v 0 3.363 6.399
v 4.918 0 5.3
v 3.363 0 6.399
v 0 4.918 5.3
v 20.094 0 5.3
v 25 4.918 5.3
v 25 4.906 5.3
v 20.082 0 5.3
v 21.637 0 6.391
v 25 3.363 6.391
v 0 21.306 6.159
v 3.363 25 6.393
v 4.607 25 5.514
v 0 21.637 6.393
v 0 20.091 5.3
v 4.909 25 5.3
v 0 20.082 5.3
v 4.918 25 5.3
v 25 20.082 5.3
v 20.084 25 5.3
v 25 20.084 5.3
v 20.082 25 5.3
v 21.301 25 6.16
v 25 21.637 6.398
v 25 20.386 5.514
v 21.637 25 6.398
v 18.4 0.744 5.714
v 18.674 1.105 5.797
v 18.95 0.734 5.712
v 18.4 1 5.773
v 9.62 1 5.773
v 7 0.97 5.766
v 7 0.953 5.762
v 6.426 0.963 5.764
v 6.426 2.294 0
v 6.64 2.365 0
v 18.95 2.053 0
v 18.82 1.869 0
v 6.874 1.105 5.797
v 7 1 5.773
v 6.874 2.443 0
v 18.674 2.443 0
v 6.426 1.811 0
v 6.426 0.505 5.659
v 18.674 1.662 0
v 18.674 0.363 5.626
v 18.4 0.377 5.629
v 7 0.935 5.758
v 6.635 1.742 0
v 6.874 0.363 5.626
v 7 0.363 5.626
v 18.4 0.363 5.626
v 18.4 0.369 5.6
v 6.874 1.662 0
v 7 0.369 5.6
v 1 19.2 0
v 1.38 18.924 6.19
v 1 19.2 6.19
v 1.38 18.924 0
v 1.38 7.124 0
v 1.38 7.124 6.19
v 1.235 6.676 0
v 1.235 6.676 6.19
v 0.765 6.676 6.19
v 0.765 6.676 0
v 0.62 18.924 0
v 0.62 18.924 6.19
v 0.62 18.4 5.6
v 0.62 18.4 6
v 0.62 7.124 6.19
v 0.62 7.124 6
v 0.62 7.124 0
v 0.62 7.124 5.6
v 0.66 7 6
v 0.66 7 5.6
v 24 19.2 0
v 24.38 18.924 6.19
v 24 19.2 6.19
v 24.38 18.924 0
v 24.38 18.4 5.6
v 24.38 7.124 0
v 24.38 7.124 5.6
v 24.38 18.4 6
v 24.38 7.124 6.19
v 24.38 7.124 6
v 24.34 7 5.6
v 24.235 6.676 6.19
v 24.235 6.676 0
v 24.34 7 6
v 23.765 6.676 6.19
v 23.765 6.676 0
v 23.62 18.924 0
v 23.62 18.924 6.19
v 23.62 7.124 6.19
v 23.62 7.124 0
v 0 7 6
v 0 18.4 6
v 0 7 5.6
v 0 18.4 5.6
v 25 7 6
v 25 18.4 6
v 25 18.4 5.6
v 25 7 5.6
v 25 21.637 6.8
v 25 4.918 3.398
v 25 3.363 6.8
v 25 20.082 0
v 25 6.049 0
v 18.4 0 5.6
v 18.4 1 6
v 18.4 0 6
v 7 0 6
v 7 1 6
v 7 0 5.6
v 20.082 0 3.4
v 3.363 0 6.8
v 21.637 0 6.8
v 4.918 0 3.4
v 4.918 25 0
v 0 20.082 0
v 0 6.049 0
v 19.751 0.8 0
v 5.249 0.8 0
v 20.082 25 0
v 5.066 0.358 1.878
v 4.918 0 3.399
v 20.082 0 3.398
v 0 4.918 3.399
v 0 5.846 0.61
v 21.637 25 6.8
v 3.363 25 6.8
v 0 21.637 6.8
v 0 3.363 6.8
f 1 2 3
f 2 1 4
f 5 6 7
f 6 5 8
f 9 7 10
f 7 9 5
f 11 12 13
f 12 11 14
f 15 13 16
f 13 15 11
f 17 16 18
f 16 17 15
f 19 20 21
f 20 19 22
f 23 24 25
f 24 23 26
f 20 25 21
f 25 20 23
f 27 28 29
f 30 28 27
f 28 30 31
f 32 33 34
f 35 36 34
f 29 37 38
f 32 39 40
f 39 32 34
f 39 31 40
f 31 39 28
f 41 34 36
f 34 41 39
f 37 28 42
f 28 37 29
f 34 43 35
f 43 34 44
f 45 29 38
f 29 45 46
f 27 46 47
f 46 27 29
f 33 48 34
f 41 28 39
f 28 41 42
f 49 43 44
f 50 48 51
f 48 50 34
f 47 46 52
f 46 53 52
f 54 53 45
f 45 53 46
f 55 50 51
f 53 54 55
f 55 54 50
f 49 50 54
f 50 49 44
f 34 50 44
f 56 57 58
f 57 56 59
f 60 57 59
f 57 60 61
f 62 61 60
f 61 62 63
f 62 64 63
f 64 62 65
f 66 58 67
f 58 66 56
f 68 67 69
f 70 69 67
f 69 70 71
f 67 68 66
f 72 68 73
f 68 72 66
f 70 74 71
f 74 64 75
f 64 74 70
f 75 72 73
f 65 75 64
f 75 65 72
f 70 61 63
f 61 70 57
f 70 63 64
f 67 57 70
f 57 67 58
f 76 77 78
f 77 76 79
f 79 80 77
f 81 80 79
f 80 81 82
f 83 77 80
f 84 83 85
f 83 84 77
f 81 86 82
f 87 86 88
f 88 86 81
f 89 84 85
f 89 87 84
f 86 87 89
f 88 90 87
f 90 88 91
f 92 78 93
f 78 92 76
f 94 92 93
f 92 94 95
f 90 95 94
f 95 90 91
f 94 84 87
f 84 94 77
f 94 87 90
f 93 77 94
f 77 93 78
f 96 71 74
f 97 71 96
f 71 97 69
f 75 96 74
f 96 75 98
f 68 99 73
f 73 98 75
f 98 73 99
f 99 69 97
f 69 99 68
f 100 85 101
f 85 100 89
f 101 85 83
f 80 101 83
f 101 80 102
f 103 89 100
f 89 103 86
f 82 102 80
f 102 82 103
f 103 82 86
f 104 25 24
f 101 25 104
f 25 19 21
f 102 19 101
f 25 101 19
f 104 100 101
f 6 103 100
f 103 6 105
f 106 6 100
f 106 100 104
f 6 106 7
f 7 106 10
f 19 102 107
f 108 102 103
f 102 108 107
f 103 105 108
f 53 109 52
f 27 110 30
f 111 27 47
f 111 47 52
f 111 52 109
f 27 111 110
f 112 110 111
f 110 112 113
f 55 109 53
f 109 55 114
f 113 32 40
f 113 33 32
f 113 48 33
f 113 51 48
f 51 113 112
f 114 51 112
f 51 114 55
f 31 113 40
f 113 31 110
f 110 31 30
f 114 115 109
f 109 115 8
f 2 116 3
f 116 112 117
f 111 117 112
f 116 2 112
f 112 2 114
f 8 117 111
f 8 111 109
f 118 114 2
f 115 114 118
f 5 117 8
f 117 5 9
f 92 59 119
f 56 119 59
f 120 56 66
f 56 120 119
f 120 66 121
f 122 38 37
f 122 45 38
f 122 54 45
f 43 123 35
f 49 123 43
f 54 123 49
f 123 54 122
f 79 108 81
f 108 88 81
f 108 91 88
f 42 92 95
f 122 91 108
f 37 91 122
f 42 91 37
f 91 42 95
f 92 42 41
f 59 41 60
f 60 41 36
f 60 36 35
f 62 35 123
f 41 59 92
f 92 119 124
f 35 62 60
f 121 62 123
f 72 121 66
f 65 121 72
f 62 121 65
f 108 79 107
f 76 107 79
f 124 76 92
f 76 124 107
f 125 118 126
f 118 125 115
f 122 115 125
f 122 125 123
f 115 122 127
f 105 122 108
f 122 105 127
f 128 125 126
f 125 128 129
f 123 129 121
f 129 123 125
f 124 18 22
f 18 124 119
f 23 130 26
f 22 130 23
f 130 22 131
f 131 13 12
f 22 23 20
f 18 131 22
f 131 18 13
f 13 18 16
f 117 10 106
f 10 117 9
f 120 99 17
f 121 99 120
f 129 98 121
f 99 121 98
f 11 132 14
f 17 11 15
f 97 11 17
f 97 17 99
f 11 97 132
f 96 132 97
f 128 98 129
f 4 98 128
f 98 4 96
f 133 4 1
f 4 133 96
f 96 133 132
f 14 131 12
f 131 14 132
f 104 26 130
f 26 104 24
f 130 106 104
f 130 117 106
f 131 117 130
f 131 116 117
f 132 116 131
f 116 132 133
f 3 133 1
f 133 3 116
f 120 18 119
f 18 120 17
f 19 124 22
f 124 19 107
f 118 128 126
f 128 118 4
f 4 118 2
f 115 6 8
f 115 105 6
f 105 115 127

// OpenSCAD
// openGrid snap type for connecting to base plates.
// The Full type is directional.
snap_type = "Full"; // [Full, Lite]

// The fitment affects the tightness of the snap when mounted (ease of removing the peg)
// Use a value between 0.0 and 1.0, with 0.5 meaning a standard fit.
// A value between 0.66-0.75 would be a tight fit, and a value of 1.0 would be very difficult to insert and remove.
snap_fitment = 0.66;

/* [Hidden] */

/*///////////////////////////
    OPENGRID SNAP
*////////////////////////////

side_length = 18.2745;
short_side_length = 15.1632;
full_side_length = 25;
cutout_offset = (full_side_length - side_length) / 2;
large_cutout_offset = (full_side_length - short_side_length) / 2;
short_tab_length = 10.8;

full_snap_thickness = 6.8;
lite_snap_thickness = 3.4;
snap_diff_thickness = full_snap_thickness - lite_snap_thickness;

module large_corner_cutouts() {
    linear_extrude(height = 5.3)
        polygon(
            points = [
                [0,0],
                [0, large_cutout_offset],
                [large_cutout_offset, 0],
                [0, full_side_length-large_cutout_offset],
                [0, full_side_length],
                [large_cutout_offset, full_side_length],
                [full_side_length-large_cutout_offset, full_side_length],
                [full_side_length, full_side_length],
                [full_side_length, full_side_length-large_cutout_offset],
                [full_side_length, large_cutout_offset],
                [full_side_length, 0],
                [full_side_length-large_cutout_offset, 0]
            ],
            paths = [[0, 1, 2], [3, 4, 5], [6, 7, 8], [9, 10, 11]]
        );
};

module corner_overhang_cutout_template() {
    translate([0, 0, 5.3])
        rotate([90, 0, 45])
            linear_extrude(height = 10)
                polygon(
                    points = [
                        [0, 0],
                        [0, 1.1],
                        [1.1, 0]
                    ],
                    paths = [[0, 1, 2]]
                );
};

module corner_overhang_cutouts() {
    translate([-.8, 4.162, 0])
        corner_overhang_cutout_template();
    
    rotate([0, 0, 90])
        translate([-1.65, -20,0])
            corner_overhang_cutout_template();
    
    rotate([0, 0, -90])
        translate([-27, 5.353, 0])
            corner_overhang_cutout_template();
    
    rotate([0, 0, 180])
        translate([-27, -19.64, 0])
            corner_overhang_cutout_template();
};

module bottom_slot_cutout_template() {
    hull()
        linear_extrude(height = 6.2) {
            circle(r = 0.4);
            translate([11.8, 0, 0]) {
                circle(r = 0.4);
            };
        };
};

module bottom_slot_cutouts() {
    rotate([13, 0, 0])
        translate([6.75, 2,-7])
            scale([1, 1, 2])
            bottom_slot_cutout_template();

    translate([1, 7, -0.01])
        rotate([0, 0, 90])
            bottom_slot_cutout_template();
    
    translate([24, 7, -0.01])
        rotate([0, 0, 90])
            bottom_slot_cutout_template();
};

module triangle_directional_cutout_template() {
    base_size = 3;
    top_scale = 0.75;
    height = 0.4;
    sin60 = 0.866;
    cos60 = 0.5;
    
    // 2D base triangle points
    base = [
        [0, -base_size],
        [base_size * sin60, base_size * cos60],
        [-base_size * sin60, base_size * cos60]
    ];
    
    // Convert to 3D
    base_3d = [ for (v = base) [v[0], v[1], 0] ];
    top     = [ for (v = base) [v[0] * top_scale, v[1] * top_scale, height] ];
    
    points = concat(base_3d, top);
    
    faces = [
        [0, 1, 2],       // bottom
        [3, 4, 5],       // top
        [0, 1, 4], [0, 4, 3],   // side 1
        [1, 2, 5], [1, 5, 4],   // side 2
        [2, 0, 3], [2, 3, 5]    // side 3
    ];
    
    polyhedron(points = points, faces = faces);
};

module triangle_directional_cutout() {
    translate([full_side_length/2, full_side_length*0.85, -0.1])
        rotate([0, 0, 180])
            triangle_directional_cutout_template();
};

module side_slot_cutouts() {
    length = 11.4;
    width = 1;
    height = 0.4;
    top_shelf_thickness = 1.2;
    top_distance = full_snap_thickness - top_shelf_thickness;
    
    translate([.75, 7, top_distance])
        rotate([0, 0, 90])
            cube([length, width, height]);
            
    translate([full_side_length-width+width, 7, top_distance])
        rotate([0, 0, 90])
            cube([length, width, height]);
    
    translate([7, 0, top_distance])
        cube([length, width, height]);
        
};

module snap_tab_large_template() {
    base_x = 14;
    base_y = 4;
    top_x = 9.5;
    top_y = 2.2;
    height = 0.8;

    // Offsets to center the top over the base
    dx = (base_x - top_x) / 2;
    dy = (base_y - top_y) / 2;

    points = [
        // Base (Z = 0)
        [0,      0,      0],  // 0
        [base_x, 0,      0],  // 1
        [base_x, base_y, 0],  // 2
        [0,      base_y, 0],  // 3

        // Top (Z = height), centered
        [dx,        dy,        height],  // 4
        [dx+top_x,  dy,        height],  // 5
        [dx+top_x,  dy+top_y,  height],  // 6
        [dx,        dy+top_y,  height]   // 7
    ];

    faces = [
        [0, 1, 2, 3],  // bottom
        [4, 5, 6, 7],  // top
        [0, 1, 5, 4],  // side 1
        [1, 2, 6, 5],  // side 2
        [2, 3, 7, 6],  // side 3
        [3, 0, 4, 7]   // side 4
    ];

    polyhedron(points=points, faces=faces);
};

module snap_tab_small_template(fitment) {
    scale([0.8, 0.5, fitment])
        snap_tab_large_template();
}

module snap_tabs(type, fitment) {

    // full or lite tab for top edge
    if (type == "Full") {
        translate([(full_side_length+14)/2, full_side_length, 1.4])
            rotate([90, 0, 180])
                snap_tab_large_template();
    } else {
        translate([(full_side_length+short_tab_length)/2+0.4, full_side_length, snap_diff_thickness])
            rotate([90, 0, 180])
                snap_tab_small_template(fitment);
    }
    
    // short tab at bottom
    translate([(full_side_length-short_tab_length)/2, 0, snap_diff_thickness])
        rotate([90, 0, 0])
            snap_tab_small_template(fitment);
    
    // short tab on left
    translate([0, (full_side_length+short_tab_length)/2+0.4, snap_diff_thickness])
        rotate([90, 0, -90])
            snap_tab_small_template(fitment);
    
    // short tab on right
    translate([full_side_length, (full_side_length-short_tab_length)/2, snap_diff_thickness])
        rotate([90, 0, 90])
            snap_tab_small_template(fitment);
};

module lite_snap_cutout() {
    linear_extrude(height = snap_diff_thickness)
        polygon(
            points = [
                [0, 0],
                [0, 30],
                [30, 30],
                [30, 0]
            ],
            paths = [[0, 1, 2, 3]]
        );
}

module bottom_half_snapfit_cutter() {
    rotate([90, 0, 90])
        linear_extrude(height = 20)
            polygon(
                points = [
                    [0, 0],
                    [0.8, 0], 
                    [0, 3.4]
                ],
                paths = [[0, 1, 2]]
            );
};

module bottom_half_snapfit_cutouts() {
    translate([3, 0, 0])
        bottom_half_snapfit_cutter();

    translate([full_side_length-cutout_offset-1.555, 0, 0])
        rotate([0, 0, 45])
            bottom_half_snapfit_cutter();
            
    translate([-3, 7.918, 0])
        rotate([0, 0, -45])
            bottom_half_snapfit_cutter();
};

module primary_box() {
    linear_extrude(height = full_snap_thickness)
        polygon(
            points = [
                [0, cutout_offset],
                [0, cutout_offset+side_length],
                [cutout_offset, full_side_length],
                [cutout_offset+side_length, full_side_length],
                [full_side_length, cutout_offset+side_length],
                [full_side_length, cutout_offset],
                [cutout_offset+side_length, 0],
                [cutout_offset, 0]
            ],
            paths = [[0, 1, 2, 3, 4, 5, 6, 7]]
        );
};

module opengrid_snap(type, fitment) {
    union() {
        difference() {
            primary_box();
            large_corner_cutouts();
            corner_overhang_cutouts();
            bottom_slot_cutouts();
            triangle_directional_cutout();
            side_slot_cutouts();
            bottom_half_snapfit_cutouts();
            if (type == "Lite") {
                lite_snap_cutout();
            }
        };
        snap_tabs(type = type, fitment = fitment);
    };
};


/*///////////////////////////
    FINAL ASSEMBLY
*////////////////////////////

opengrid_snap("Full", 0.66);
